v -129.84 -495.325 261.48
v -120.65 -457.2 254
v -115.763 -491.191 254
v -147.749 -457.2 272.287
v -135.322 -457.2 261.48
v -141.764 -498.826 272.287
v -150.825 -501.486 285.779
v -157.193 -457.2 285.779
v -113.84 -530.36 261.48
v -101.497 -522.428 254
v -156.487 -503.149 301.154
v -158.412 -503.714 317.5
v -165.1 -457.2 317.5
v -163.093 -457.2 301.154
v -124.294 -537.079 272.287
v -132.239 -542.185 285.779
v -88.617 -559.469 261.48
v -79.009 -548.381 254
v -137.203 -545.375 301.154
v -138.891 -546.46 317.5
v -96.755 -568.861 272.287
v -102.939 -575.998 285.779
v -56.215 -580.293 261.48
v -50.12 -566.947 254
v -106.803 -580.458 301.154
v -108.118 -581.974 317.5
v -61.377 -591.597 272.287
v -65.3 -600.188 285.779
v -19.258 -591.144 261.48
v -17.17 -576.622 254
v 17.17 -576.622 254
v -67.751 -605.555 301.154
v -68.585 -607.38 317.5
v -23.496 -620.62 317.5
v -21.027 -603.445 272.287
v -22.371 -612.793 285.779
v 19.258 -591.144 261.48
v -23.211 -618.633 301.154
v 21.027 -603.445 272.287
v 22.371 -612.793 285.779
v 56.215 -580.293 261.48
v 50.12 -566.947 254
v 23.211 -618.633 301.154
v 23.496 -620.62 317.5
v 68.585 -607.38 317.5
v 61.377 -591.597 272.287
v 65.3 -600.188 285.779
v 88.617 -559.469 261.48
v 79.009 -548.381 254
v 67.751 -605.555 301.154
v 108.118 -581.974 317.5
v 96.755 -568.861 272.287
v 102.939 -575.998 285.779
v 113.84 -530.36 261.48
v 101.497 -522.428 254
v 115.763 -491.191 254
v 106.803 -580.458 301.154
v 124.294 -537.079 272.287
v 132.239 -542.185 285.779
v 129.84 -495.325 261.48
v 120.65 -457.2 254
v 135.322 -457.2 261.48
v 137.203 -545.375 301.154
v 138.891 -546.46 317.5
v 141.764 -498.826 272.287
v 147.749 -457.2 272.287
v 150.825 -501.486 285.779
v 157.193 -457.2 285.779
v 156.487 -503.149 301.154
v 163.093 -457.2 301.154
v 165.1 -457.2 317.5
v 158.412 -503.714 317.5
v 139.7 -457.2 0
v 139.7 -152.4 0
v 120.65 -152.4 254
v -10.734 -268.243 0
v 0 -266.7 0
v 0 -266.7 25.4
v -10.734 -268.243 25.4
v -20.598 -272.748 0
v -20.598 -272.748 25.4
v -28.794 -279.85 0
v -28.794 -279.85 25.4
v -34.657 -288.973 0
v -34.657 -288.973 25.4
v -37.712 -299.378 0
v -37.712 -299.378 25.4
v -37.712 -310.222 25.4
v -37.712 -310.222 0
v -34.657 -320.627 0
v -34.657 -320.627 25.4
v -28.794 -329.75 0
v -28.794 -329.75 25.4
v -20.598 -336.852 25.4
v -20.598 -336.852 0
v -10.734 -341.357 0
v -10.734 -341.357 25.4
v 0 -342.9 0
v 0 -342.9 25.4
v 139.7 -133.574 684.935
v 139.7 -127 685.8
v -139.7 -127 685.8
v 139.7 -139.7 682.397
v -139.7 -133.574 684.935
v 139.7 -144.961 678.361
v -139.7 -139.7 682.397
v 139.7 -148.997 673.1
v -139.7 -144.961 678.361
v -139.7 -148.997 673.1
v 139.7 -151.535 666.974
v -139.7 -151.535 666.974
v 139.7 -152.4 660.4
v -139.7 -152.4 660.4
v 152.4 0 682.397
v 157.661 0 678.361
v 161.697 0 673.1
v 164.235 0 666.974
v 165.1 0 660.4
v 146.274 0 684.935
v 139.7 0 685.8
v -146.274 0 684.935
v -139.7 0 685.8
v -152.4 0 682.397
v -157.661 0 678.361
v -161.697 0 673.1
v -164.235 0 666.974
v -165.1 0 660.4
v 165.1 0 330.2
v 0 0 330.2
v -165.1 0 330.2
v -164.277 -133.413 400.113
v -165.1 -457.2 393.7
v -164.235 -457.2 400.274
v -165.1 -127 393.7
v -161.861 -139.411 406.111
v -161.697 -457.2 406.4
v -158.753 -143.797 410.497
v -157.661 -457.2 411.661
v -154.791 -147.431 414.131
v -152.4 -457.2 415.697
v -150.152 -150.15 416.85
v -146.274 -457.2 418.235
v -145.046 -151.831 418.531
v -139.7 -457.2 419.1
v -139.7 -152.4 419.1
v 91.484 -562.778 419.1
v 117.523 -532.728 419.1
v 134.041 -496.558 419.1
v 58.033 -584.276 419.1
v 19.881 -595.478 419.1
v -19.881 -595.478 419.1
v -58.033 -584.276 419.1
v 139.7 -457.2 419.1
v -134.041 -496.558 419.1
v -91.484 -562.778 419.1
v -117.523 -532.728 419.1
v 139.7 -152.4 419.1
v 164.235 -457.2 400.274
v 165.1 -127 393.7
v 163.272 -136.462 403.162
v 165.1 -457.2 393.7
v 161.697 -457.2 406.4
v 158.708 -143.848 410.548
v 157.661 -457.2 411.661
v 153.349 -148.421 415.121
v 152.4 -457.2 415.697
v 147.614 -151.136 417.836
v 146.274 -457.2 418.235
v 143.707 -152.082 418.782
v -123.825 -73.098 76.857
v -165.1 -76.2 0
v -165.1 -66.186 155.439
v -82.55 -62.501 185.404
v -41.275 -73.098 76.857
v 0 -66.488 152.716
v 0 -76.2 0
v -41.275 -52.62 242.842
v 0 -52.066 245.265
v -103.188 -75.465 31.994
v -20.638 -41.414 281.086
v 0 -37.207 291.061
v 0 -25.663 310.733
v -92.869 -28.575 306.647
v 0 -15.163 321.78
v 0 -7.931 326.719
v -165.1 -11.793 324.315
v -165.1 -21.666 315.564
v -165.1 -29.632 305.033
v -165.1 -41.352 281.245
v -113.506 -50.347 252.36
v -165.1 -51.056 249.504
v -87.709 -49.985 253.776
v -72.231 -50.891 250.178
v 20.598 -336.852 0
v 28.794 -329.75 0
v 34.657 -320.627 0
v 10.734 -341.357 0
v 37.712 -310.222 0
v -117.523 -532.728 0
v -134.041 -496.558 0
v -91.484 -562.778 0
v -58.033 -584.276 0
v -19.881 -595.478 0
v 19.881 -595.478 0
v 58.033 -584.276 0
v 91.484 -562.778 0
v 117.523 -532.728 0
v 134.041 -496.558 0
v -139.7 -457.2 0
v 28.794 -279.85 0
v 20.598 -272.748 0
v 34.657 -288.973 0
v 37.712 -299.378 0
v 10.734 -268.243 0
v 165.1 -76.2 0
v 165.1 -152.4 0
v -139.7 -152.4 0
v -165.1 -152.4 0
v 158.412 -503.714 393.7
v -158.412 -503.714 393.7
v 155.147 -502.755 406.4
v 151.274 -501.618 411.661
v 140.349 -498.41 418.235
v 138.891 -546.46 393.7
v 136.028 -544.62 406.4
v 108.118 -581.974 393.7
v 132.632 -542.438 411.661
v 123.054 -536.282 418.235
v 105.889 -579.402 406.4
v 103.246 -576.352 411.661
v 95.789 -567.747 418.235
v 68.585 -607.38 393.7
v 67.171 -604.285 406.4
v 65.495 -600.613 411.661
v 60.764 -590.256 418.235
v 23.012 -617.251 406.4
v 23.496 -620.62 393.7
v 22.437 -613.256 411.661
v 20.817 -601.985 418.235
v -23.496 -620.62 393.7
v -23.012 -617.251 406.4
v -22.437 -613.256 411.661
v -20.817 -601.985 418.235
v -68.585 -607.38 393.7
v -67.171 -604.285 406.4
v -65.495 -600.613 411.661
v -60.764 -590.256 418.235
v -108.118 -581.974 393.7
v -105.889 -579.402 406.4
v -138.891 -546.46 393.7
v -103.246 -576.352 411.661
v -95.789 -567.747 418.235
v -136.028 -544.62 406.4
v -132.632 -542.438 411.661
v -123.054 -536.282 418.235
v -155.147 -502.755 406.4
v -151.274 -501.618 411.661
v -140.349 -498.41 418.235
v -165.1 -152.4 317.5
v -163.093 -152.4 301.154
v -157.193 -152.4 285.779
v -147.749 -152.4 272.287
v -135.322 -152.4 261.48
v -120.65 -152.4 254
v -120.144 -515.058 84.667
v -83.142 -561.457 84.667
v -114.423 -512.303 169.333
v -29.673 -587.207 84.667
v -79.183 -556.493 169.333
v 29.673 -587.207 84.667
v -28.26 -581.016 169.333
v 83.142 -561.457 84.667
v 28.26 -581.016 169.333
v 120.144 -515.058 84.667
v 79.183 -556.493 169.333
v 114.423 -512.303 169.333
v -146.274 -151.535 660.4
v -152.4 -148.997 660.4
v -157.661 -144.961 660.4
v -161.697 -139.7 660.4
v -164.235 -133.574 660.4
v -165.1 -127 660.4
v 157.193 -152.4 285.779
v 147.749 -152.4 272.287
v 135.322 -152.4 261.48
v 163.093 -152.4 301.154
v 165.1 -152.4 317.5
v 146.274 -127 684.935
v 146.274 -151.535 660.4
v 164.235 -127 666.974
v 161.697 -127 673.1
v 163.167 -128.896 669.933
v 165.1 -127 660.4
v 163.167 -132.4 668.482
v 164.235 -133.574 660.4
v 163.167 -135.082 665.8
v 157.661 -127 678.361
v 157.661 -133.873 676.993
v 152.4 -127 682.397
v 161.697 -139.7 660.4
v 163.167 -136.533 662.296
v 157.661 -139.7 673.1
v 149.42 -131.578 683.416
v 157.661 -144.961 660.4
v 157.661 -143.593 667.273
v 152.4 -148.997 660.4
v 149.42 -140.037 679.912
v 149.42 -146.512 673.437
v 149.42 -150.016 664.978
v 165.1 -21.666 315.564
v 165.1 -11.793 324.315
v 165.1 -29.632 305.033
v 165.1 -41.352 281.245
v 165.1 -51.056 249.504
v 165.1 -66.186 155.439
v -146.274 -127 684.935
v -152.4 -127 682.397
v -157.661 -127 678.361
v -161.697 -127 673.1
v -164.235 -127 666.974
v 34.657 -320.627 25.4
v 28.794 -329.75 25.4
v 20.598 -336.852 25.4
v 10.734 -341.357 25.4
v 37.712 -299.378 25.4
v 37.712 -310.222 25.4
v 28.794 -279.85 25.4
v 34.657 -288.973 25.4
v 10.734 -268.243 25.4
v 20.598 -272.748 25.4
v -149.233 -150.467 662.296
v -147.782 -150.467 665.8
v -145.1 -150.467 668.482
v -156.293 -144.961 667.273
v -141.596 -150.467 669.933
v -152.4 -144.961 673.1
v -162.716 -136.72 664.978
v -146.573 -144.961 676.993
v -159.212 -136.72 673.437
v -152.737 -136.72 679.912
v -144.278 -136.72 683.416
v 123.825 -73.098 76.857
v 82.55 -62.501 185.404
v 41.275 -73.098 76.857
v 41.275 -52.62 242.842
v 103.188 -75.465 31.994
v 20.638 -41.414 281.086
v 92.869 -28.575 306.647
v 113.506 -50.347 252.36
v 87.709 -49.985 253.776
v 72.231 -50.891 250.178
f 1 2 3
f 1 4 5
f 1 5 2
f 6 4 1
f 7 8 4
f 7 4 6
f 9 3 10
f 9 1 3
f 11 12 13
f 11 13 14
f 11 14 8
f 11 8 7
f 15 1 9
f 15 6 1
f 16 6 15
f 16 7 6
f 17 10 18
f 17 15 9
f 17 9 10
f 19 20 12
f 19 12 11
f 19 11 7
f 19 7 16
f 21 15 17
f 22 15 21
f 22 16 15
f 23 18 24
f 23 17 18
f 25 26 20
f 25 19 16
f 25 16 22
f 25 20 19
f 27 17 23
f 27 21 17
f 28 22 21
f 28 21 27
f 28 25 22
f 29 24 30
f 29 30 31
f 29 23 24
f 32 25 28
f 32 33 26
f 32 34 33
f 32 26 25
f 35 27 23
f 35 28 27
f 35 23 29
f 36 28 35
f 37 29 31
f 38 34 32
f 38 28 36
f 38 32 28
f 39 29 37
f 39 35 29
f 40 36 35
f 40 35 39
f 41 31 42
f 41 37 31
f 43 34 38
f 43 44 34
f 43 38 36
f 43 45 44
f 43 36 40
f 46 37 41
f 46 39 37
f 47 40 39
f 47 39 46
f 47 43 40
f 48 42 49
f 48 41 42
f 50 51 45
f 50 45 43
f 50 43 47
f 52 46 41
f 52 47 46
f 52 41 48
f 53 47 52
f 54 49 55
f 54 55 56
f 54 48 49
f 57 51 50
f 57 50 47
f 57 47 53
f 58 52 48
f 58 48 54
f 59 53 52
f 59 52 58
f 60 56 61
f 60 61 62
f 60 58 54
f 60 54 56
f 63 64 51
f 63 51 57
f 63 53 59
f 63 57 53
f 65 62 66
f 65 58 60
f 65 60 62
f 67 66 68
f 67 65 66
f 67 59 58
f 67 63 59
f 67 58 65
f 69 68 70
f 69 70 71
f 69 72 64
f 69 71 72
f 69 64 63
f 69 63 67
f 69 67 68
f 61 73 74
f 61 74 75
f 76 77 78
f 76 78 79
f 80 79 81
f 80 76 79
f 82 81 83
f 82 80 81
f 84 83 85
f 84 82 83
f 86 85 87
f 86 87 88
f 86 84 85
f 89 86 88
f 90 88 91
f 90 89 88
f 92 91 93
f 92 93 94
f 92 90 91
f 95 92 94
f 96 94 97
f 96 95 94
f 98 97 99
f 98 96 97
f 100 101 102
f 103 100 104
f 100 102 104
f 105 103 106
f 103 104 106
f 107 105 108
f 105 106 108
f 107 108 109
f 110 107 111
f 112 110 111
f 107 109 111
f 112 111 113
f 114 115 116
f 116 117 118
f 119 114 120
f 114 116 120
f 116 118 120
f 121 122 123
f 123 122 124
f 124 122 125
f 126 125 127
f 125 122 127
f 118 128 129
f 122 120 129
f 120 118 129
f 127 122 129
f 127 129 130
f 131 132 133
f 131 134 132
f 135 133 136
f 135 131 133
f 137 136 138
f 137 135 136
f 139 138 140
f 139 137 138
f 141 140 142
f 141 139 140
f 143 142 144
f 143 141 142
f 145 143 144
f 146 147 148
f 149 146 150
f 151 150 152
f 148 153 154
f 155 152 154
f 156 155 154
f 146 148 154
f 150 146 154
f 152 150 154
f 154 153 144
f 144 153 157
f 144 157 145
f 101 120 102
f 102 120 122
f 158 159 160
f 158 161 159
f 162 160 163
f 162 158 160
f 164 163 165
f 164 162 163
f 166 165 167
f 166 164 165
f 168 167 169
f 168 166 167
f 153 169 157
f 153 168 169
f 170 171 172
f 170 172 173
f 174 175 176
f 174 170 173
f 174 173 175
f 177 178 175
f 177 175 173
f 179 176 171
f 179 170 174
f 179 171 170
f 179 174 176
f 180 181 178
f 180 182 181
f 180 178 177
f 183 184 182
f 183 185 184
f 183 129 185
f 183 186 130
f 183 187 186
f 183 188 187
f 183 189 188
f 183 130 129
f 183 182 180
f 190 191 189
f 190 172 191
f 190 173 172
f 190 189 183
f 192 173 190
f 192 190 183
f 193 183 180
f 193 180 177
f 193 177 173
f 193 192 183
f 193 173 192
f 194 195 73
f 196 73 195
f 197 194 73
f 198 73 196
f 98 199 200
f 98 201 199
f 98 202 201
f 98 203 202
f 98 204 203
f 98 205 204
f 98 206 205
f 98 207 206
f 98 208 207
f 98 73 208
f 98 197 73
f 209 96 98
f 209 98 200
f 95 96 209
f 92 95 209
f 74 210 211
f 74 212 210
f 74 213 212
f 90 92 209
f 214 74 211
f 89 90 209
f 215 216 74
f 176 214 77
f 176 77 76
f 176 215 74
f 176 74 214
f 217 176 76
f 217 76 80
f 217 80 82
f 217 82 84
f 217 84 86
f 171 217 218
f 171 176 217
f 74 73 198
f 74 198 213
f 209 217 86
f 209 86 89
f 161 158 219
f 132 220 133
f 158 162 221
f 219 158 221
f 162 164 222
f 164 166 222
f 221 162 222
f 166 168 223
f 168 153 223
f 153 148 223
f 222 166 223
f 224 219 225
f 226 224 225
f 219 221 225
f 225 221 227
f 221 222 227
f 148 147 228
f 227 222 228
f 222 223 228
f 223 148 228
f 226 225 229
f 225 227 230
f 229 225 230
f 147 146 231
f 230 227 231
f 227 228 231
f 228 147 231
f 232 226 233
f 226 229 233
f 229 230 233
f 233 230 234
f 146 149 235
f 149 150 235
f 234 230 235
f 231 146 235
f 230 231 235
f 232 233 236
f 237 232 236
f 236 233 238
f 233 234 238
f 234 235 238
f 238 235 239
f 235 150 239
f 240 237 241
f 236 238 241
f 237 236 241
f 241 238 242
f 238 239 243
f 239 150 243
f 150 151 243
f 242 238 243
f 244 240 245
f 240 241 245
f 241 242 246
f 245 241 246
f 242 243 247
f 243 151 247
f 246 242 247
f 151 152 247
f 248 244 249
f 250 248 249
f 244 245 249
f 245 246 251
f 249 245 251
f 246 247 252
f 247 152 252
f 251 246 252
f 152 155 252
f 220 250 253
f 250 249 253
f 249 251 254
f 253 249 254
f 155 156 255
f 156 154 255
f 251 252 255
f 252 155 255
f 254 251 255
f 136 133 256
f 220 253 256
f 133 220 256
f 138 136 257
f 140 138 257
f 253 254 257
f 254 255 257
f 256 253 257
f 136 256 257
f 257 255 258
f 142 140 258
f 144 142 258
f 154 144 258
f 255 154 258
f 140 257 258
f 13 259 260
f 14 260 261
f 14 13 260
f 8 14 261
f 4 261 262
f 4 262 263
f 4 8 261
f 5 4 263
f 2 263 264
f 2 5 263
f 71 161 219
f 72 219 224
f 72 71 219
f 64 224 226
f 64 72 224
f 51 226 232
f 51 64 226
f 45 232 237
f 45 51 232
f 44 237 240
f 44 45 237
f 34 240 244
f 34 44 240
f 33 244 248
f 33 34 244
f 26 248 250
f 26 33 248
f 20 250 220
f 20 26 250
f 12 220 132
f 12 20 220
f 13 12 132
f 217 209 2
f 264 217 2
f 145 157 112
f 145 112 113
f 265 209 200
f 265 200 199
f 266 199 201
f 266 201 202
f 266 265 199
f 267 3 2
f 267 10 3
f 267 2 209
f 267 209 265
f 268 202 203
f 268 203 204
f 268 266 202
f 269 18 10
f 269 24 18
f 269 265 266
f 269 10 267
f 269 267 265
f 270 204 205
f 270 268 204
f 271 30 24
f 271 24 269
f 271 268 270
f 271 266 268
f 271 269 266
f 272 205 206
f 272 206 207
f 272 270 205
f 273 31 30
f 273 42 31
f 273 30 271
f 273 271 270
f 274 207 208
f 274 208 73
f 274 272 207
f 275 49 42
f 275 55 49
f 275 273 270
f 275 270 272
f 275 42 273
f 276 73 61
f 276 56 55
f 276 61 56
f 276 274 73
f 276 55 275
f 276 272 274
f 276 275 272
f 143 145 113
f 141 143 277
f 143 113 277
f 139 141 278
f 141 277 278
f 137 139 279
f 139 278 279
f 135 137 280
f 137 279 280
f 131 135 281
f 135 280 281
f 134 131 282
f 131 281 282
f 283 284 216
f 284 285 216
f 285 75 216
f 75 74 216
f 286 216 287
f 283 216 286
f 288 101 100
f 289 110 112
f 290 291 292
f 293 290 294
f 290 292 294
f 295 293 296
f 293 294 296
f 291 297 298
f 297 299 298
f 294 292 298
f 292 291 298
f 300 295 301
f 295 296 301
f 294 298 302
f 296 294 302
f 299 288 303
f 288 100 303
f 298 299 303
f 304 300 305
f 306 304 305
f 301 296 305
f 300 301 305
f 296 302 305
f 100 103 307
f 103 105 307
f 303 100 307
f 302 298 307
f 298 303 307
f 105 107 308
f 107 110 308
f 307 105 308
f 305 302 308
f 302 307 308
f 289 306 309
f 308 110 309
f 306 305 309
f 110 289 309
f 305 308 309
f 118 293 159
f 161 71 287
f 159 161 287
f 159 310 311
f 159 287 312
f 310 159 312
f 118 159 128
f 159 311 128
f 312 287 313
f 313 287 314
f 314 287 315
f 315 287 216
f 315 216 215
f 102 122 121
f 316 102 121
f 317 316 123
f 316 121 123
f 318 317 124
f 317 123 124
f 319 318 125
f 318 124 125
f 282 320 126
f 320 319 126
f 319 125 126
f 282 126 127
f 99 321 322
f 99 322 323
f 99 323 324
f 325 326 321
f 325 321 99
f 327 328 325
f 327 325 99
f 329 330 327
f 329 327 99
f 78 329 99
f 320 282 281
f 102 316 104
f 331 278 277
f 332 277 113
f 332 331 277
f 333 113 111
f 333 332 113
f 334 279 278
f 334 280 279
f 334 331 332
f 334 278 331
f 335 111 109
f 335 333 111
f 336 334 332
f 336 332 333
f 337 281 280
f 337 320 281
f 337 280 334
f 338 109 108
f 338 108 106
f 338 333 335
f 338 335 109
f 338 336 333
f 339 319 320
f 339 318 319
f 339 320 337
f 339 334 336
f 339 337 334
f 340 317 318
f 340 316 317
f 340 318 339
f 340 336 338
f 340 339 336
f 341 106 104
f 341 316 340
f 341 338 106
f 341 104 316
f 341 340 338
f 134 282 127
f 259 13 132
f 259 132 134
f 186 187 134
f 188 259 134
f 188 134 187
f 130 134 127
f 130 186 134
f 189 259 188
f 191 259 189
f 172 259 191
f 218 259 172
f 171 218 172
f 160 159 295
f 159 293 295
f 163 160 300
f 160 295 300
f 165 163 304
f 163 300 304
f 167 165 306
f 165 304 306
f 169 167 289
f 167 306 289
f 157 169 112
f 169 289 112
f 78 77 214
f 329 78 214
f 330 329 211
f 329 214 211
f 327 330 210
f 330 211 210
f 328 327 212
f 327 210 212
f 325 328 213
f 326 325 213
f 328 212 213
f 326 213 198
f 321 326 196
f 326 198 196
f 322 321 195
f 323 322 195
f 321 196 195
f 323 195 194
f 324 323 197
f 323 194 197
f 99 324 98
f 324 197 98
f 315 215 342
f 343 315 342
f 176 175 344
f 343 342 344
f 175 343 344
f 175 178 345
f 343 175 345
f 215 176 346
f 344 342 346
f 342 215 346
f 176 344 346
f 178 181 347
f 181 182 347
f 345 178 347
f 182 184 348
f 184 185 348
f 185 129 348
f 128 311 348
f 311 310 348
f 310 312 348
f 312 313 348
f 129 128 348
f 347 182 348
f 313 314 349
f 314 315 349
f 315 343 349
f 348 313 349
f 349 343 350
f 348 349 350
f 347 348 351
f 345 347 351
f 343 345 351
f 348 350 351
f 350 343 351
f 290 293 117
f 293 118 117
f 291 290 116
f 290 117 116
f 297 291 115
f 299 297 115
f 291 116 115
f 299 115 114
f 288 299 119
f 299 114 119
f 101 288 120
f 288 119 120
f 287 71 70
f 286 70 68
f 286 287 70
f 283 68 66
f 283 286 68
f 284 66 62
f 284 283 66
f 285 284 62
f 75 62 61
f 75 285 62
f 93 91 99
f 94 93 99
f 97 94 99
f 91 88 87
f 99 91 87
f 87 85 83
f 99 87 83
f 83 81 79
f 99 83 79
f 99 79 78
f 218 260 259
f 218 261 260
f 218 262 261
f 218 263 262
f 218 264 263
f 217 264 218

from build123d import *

# Parameters (mm, degrees)
F0_R          = 12.7
F1_DEPTH      = 419.1
F0_W          = 165.1
F0_H          = 152.4
F2_DEPTH      = 685.8
F3_DEPTH      = 25.4
F8_DEPTH      = 165.1010001
F8_DEPTH_BACK = 165.1010001
F9_R          = 25.4


with BuildPart() as f1:
    # F0 (on Top) → F1 (new body)
    with BuildSketch(Plane.XY):
        with BuildLine():
            Line((0, -266.7), (0, -152.4))
            Line((0, -152.4), (-165.1, -152.4))
            Line((-165.1, -152.4), (-165.1, -457.2))
            ThreePointArc((-165.1, -457.2), (-116.7433295739, -573.9433295739), (0, -622.3))
            Line((0, -622.3), (0, -342.9))
            ThreePointArc((0, -342.9), (-38.1, -304.8), (0, -266.7))
        make_face()
        with Locations((-101.6, -203.2)):
            Circle(F0_R, mode=Mode.SUBTRACT)
        with Locations((-101.6, -203.2)):
            Circle(F0_R)
        with BuildLine():
            Line((0, -342.9), (0, -266.7))
            ThreePointArc((0, -266.7), (-38.1, -304.8), (0, -342.9))
        make_face()
    extrude(amount=F1_DEPTH)

    # F0 (on Top) → F2 (join)
    with BuildSketch(Plane.XY):
        with Locations((-82.55, -76.2)):
            Rectangle(F0_W, F0_H)
    extrude(amount=F2_DEPTH)

    # F0 (on Top) → F3 (cut)
    with BuildSketch(Plane.XY):
        with BuildLine():
            Line((0, -342.9), (0, -266.7))
            ThreePointArc((0, -266.7), (-38.1, -304.8), (0, -342.9))
        make_face()
    extrude(amount=F3_DEPTH, mode=Mode.SUBTRACT)

    # F4: F1 across face


with BuildPart() as f1_1:
    add(f1.part)
    add(f1.part.mirror(Plane(origin=(0, -279.3076736672, 257.3545234249), x_dir=(0, 1, 0), z_dir=(1, 0, 0))))

    # F6: sweep along a path in F6_path
    with BuildLine(Plane(origin=(-165.1, -152.4, 419.1), x_dir=(0, 1, 0), z_dir=(0, 0, 1))) as f6_path:
        Line((0, 0), (-304.8, 0))
        ThreePointArc((-304.8, 0), (-469.9, -165.1), (-304.8, -330.2))
        Line((-304.8, -330.2), (0, -330.2))
    # F5 (on face) → F6 (sweep, cut)
    with BuildSketch(Plane.XZ.offset(152.4)):
        with BuildLine():
            ThreePointArc((-120.65, 254), (-152.8833058285, 278.74418592), (-165.1, 317.5))
            Line((-165.1, 317.5), (-165.1, 0))
            Line((-165.1, 0), (-139.7, 0))
            Line((-139.7, 0), (-120.65, 254))
        make_face()
    sweep(path=f6_path.line, mode=Mode.SUBTRACT)

    # F7 (on Right) → F8 (cut, two sides)
    with BuildSketch(Plane.YZ) as f8_sk:
        with BuildLine():
            add(Edge.make_bspline(
                [(-76.2, 0), (-76.2, 31.8793983715), (-69.0790448855, 184.3952112859), (-38.761105776, 317.4984685435), (0, 330.2)],
                knots=[0, 0, 0, 0, 0.5205513628, 1, 1, 1, 1], degree=3))
            Line((-76.2, 0), (0, 0))
            Line((0, 0), (0, 330.2))
        make_face()
    extrude(amount=-F8_DEPTH, mode=Mode.SUBTRACT)
    extrude(f8_sk.sketch, amount=F8_DEPTH_BACK, mode=Mode.SUBTRACT)

    # F9
    f9_edges = [f1_1.edges().sort_by_distance(p)[0] for p in [
        (-165.1, -76.2, 685.8),
        (-165.1, -152.4, 552.45),
        (0, -152.4, 685.8),
        (165.1, -76.2, 685.8),
        (165.1, -152.4, 552.45),
        (165.1, -304.8, 419.1),
        (0, -622.3, 419.1),
        (-165.1, -304.8, 419.1),
    ]]
    fillet(f9_edges, radius=F9_R)


solid = f1_1.part
